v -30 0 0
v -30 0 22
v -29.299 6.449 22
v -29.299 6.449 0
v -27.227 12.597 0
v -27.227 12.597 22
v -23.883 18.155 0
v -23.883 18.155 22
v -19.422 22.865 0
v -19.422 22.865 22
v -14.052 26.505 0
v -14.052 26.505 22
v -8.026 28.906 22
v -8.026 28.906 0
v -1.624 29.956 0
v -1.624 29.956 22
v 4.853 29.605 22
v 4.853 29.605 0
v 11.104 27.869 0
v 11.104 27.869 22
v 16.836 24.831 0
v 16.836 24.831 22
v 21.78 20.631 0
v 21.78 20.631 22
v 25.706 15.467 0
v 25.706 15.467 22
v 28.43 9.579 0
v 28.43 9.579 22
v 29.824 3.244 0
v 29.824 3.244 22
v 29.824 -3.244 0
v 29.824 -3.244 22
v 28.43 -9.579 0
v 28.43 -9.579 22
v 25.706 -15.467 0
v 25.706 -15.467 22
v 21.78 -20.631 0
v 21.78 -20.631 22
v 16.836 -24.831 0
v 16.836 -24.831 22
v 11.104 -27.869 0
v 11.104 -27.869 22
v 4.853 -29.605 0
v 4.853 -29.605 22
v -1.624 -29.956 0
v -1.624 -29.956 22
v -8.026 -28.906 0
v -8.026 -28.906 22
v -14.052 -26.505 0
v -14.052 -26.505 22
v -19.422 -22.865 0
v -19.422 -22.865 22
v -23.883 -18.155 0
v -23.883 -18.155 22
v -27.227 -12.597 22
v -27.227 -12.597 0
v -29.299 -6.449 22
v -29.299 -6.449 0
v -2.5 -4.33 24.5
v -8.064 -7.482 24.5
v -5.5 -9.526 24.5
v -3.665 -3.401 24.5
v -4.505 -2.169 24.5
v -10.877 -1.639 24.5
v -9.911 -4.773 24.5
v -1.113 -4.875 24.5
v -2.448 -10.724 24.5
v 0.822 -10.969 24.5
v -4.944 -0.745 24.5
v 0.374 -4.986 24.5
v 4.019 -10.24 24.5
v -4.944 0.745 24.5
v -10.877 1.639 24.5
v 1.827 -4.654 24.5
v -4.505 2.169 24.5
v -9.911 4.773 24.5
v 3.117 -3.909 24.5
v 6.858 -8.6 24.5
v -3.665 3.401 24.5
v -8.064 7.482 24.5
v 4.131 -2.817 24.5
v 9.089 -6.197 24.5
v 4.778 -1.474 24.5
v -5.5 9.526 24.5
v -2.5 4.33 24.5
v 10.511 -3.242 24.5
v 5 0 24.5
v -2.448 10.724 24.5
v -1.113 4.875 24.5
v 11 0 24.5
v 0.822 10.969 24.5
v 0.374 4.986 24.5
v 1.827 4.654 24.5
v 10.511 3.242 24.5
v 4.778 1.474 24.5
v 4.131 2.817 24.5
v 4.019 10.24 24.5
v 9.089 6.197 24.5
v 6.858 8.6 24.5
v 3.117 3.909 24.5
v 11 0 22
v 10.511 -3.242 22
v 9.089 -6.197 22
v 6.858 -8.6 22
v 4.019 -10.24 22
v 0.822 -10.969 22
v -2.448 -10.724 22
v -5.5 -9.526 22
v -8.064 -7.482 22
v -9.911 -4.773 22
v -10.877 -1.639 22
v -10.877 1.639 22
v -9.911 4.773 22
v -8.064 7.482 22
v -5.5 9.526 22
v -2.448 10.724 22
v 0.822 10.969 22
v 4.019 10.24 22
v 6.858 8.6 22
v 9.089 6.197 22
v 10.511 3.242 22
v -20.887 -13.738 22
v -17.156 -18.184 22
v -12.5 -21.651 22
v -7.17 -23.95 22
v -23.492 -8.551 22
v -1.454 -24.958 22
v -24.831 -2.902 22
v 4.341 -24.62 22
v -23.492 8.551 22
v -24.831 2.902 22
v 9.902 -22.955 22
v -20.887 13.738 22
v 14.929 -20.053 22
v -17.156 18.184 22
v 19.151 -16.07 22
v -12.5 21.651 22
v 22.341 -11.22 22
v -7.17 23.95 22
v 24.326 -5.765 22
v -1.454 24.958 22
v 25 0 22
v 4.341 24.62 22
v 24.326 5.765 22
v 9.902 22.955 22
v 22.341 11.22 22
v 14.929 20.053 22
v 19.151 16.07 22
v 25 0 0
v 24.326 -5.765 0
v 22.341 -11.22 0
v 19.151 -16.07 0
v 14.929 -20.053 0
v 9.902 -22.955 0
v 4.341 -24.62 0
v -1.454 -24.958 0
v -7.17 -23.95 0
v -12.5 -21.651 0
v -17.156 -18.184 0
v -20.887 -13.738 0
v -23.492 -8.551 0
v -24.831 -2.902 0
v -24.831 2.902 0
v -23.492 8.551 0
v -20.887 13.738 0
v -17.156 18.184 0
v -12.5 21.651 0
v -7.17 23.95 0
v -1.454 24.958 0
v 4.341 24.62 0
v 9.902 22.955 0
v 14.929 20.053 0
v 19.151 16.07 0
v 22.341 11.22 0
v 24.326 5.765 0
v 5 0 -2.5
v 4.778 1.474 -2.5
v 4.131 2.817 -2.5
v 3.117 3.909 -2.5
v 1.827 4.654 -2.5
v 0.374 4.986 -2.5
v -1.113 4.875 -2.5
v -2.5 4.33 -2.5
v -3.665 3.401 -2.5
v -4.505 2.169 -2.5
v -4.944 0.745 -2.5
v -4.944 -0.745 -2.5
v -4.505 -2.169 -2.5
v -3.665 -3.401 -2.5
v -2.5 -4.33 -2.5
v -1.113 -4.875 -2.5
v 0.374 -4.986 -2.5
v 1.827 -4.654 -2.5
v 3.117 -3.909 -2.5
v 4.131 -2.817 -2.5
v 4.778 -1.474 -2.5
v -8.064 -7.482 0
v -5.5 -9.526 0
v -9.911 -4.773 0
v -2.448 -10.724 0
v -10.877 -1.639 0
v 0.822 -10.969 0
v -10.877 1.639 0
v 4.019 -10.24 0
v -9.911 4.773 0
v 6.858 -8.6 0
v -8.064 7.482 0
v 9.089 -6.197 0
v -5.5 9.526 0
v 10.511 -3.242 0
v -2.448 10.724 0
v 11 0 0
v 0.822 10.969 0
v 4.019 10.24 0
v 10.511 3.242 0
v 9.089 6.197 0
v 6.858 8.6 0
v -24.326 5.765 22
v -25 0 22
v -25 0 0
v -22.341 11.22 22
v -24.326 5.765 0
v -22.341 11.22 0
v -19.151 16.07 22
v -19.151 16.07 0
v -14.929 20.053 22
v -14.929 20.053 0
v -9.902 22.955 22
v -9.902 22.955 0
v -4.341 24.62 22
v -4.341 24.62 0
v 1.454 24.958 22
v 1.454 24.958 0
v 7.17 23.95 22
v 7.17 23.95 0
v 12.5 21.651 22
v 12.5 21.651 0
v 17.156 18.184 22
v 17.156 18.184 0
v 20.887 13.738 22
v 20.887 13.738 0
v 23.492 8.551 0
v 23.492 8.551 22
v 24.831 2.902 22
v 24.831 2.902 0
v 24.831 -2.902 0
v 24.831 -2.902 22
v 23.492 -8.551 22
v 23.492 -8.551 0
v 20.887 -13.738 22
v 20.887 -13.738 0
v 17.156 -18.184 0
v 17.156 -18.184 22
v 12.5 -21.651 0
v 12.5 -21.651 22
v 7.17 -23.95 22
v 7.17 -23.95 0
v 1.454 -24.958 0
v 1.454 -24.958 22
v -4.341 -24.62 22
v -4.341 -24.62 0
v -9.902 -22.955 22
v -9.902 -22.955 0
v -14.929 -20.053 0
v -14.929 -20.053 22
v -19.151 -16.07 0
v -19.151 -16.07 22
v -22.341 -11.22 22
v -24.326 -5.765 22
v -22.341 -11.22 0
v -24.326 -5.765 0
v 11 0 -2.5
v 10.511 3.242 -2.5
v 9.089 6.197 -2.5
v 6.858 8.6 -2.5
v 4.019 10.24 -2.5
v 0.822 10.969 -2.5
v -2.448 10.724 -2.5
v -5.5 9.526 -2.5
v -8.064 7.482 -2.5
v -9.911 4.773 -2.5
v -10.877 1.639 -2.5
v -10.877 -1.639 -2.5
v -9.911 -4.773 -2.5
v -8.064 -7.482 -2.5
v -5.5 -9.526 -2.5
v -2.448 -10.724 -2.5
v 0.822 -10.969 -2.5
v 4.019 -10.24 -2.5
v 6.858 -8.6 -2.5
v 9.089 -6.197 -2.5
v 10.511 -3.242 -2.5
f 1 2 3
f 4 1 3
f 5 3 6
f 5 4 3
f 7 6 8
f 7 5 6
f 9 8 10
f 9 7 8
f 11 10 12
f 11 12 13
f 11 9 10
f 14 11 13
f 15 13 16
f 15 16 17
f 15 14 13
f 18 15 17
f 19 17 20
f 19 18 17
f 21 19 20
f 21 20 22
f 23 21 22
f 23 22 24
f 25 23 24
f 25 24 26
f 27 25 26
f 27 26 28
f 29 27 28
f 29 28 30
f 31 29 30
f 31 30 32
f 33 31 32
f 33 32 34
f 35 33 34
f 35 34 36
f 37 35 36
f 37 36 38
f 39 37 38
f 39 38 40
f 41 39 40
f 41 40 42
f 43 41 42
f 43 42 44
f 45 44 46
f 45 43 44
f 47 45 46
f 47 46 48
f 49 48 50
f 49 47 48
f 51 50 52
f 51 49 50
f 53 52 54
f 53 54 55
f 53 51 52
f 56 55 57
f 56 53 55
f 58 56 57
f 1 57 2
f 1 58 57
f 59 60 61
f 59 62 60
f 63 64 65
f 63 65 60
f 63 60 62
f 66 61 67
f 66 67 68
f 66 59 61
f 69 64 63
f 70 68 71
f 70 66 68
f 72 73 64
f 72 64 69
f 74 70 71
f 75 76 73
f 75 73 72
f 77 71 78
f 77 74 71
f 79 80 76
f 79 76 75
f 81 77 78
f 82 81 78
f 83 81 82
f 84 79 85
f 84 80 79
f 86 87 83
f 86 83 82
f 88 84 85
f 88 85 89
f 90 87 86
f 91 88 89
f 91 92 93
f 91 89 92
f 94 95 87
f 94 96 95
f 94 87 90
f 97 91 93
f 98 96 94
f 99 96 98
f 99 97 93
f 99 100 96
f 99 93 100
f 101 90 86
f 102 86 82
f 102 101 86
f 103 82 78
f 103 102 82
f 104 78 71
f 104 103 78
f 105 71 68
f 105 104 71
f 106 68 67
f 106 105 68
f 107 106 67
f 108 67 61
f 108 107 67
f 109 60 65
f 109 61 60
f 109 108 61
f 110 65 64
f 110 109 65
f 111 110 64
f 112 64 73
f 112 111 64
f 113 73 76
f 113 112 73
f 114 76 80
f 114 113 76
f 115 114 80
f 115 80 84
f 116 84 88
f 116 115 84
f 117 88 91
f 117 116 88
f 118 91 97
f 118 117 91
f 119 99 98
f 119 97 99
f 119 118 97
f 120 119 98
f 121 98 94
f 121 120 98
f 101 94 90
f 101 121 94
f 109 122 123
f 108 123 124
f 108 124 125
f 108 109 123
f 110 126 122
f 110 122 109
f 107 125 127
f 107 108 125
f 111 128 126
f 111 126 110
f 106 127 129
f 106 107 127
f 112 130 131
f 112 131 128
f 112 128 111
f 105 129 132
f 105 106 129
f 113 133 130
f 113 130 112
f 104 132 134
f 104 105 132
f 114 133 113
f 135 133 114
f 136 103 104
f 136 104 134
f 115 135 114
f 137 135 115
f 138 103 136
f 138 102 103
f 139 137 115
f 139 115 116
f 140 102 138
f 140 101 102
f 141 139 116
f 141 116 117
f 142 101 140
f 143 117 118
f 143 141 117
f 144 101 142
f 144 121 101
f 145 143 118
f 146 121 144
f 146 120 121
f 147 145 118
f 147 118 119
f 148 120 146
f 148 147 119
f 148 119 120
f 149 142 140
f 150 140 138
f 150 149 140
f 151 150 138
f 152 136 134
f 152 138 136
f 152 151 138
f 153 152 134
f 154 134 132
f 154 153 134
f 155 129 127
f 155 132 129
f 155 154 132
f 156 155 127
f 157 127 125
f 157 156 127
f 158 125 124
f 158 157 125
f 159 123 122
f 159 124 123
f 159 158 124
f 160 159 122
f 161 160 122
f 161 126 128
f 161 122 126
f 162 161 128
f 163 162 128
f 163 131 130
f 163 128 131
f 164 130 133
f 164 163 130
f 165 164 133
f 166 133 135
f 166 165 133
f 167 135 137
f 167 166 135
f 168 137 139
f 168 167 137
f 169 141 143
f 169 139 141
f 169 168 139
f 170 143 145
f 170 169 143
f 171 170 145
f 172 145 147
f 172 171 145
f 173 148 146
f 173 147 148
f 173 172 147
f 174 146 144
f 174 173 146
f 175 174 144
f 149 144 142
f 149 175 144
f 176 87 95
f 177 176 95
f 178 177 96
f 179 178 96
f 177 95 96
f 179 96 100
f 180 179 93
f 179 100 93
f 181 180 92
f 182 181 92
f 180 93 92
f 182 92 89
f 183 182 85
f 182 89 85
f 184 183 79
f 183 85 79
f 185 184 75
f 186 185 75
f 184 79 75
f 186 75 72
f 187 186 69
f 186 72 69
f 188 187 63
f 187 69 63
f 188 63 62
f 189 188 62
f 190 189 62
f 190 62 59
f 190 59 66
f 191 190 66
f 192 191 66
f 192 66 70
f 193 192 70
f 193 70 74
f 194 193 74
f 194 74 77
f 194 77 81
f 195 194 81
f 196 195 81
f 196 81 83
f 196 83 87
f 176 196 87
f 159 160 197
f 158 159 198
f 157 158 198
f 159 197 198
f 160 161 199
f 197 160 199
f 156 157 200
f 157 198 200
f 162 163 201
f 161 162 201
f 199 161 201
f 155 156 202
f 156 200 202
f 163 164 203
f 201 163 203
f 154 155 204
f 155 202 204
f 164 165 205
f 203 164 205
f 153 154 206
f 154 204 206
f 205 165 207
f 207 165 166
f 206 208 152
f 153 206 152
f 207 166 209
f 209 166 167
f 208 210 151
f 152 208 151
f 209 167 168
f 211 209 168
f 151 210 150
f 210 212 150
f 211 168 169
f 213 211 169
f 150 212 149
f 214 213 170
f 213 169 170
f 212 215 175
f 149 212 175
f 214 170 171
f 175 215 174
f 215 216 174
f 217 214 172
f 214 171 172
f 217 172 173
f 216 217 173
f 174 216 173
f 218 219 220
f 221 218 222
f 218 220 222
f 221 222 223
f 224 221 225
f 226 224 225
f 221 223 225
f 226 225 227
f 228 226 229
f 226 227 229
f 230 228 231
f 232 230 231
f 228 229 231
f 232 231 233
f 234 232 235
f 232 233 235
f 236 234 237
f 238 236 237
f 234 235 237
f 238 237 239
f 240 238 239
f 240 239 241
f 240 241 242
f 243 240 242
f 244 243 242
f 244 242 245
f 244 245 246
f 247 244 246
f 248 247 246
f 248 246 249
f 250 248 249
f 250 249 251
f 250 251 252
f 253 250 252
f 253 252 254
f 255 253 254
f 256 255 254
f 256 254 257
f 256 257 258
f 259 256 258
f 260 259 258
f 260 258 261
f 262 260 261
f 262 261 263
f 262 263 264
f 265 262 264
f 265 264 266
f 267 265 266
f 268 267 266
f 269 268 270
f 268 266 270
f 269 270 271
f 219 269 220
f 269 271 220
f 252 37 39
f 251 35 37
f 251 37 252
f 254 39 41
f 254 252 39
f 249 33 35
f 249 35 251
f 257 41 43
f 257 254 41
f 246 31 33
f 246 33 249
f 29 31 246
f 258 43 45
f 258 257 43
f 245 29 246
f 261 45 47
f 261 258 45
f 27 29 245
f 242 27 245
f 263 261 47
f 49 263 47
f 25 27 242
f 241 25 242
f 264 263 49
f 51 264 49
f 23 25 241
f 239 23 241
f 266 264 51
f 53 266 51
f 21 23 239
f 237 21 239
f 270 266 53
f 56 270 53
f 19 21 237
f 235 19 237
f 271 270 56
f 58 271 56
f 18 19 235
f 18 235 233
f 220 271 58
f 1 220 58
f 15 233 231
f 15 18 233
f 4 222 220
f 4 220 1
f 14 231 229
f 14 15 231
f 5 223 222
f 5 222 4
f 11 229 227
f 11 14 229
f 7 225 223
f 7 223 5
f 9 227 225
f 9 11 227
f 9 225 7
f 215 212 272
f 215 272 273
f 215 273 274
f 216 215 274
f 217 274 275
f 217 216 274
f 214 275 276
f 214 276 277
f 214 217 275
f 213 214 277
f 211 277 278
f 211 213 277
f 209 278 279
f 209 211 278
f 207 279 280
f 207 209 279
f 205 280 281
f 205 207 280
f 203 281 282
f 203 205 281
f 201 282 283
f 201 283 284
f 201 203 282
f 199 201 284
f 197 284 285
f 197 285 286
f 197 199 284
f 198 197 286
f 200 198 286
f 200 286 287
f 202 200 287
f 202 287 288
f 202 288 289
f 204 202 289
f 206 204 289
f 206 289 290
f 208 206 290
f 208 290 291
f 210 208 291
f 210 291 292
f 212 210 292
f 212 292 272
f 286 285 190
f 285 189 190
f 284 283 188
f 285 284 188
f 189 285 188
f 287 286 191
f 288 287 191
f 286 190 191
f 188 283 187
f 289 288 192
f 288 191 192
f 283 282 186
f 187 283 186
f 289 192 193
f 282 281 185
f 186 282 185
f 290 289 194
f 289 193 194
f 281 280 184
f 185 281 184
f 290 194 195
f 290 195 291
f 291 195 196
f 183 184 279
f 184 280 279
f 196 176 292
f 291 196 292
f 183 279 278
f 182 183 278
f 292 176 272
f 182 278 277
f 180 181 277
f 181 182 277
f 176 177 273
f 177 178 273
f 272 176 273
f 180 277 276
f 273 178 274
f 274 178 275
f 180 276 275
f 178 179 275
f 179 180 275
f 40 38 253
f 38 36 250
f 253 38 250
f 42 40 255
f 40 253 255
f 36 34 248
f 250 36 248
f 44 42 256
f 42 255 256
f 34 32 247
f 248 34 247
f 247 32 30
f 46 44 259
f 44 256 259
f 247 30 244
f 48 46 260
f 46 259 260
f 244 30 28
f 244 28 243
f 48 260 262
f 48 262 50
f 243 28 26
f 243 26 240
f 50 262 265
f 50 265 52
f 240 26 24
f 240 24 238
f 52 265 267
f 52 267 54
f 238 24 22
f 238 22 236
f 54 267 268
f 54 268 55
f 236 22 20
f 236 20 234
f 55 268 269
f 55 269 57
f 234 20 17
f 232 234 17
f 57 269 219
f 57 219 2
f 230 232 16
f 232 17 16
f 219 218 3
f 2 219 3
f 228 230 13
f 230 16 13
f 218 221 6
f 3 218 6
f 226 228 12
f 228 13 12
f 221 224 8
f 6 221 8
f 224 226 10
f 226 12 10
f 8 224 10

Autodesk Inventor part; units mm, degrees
ref_plane "YZ Plane" through (0, 0, 0) normal (1, 0, 0) x (0, 1, 0)
ref_plane "XZ Plane" through (0, 0, 0) normal (0, 1, 0) x (-1, 0, 0)
sketch "Skizze1" plane through (0, 0, 0) normal (0, 0, 1) x (1, 0, 0)
  circle A0 centre (0, 0) radius 25
  circle A1 centre (0, 0) radius 5
  dimension "d0" = 50
  dimension "d1" = 10
extrude "Extrusion1" add sketch "Skizze1" along normal blind 22
sketch "Skizze2" plane through (0, 0, 0) normal (0, 0, -1) x (-1, 0, 0)
  circle A0 centre (0, 0) radius 30
  circle A1 centre (0, 0) radius 5 projected
  circle A2 centre (0, 0) radius 25 projected
  dimension "d4" = 60
extrude "Extrusion2" add sketch "Skizze2" against normal up to surface (22 mm away) separate body contours A0
ref_plane "Arbeitsebene1" through (0, 0, 11) normal (0, 0, 1) x (1, 0, 0)
sketch "Skizze3" plane through (0, 0, 11) normal (0, 0, 1) x (1, 0, 0)
  circle A0 centre (0, 0) radius 11
  circle A1 centre (0, 0) radius 5 projected
  dimension "d7" = 22
extrude "Extrusion3" add sketch "Skizze3" along normal mid plane 27 bodies 1
properties part number "Gummiwalze" material "PC/ABS-Kunststoff"
